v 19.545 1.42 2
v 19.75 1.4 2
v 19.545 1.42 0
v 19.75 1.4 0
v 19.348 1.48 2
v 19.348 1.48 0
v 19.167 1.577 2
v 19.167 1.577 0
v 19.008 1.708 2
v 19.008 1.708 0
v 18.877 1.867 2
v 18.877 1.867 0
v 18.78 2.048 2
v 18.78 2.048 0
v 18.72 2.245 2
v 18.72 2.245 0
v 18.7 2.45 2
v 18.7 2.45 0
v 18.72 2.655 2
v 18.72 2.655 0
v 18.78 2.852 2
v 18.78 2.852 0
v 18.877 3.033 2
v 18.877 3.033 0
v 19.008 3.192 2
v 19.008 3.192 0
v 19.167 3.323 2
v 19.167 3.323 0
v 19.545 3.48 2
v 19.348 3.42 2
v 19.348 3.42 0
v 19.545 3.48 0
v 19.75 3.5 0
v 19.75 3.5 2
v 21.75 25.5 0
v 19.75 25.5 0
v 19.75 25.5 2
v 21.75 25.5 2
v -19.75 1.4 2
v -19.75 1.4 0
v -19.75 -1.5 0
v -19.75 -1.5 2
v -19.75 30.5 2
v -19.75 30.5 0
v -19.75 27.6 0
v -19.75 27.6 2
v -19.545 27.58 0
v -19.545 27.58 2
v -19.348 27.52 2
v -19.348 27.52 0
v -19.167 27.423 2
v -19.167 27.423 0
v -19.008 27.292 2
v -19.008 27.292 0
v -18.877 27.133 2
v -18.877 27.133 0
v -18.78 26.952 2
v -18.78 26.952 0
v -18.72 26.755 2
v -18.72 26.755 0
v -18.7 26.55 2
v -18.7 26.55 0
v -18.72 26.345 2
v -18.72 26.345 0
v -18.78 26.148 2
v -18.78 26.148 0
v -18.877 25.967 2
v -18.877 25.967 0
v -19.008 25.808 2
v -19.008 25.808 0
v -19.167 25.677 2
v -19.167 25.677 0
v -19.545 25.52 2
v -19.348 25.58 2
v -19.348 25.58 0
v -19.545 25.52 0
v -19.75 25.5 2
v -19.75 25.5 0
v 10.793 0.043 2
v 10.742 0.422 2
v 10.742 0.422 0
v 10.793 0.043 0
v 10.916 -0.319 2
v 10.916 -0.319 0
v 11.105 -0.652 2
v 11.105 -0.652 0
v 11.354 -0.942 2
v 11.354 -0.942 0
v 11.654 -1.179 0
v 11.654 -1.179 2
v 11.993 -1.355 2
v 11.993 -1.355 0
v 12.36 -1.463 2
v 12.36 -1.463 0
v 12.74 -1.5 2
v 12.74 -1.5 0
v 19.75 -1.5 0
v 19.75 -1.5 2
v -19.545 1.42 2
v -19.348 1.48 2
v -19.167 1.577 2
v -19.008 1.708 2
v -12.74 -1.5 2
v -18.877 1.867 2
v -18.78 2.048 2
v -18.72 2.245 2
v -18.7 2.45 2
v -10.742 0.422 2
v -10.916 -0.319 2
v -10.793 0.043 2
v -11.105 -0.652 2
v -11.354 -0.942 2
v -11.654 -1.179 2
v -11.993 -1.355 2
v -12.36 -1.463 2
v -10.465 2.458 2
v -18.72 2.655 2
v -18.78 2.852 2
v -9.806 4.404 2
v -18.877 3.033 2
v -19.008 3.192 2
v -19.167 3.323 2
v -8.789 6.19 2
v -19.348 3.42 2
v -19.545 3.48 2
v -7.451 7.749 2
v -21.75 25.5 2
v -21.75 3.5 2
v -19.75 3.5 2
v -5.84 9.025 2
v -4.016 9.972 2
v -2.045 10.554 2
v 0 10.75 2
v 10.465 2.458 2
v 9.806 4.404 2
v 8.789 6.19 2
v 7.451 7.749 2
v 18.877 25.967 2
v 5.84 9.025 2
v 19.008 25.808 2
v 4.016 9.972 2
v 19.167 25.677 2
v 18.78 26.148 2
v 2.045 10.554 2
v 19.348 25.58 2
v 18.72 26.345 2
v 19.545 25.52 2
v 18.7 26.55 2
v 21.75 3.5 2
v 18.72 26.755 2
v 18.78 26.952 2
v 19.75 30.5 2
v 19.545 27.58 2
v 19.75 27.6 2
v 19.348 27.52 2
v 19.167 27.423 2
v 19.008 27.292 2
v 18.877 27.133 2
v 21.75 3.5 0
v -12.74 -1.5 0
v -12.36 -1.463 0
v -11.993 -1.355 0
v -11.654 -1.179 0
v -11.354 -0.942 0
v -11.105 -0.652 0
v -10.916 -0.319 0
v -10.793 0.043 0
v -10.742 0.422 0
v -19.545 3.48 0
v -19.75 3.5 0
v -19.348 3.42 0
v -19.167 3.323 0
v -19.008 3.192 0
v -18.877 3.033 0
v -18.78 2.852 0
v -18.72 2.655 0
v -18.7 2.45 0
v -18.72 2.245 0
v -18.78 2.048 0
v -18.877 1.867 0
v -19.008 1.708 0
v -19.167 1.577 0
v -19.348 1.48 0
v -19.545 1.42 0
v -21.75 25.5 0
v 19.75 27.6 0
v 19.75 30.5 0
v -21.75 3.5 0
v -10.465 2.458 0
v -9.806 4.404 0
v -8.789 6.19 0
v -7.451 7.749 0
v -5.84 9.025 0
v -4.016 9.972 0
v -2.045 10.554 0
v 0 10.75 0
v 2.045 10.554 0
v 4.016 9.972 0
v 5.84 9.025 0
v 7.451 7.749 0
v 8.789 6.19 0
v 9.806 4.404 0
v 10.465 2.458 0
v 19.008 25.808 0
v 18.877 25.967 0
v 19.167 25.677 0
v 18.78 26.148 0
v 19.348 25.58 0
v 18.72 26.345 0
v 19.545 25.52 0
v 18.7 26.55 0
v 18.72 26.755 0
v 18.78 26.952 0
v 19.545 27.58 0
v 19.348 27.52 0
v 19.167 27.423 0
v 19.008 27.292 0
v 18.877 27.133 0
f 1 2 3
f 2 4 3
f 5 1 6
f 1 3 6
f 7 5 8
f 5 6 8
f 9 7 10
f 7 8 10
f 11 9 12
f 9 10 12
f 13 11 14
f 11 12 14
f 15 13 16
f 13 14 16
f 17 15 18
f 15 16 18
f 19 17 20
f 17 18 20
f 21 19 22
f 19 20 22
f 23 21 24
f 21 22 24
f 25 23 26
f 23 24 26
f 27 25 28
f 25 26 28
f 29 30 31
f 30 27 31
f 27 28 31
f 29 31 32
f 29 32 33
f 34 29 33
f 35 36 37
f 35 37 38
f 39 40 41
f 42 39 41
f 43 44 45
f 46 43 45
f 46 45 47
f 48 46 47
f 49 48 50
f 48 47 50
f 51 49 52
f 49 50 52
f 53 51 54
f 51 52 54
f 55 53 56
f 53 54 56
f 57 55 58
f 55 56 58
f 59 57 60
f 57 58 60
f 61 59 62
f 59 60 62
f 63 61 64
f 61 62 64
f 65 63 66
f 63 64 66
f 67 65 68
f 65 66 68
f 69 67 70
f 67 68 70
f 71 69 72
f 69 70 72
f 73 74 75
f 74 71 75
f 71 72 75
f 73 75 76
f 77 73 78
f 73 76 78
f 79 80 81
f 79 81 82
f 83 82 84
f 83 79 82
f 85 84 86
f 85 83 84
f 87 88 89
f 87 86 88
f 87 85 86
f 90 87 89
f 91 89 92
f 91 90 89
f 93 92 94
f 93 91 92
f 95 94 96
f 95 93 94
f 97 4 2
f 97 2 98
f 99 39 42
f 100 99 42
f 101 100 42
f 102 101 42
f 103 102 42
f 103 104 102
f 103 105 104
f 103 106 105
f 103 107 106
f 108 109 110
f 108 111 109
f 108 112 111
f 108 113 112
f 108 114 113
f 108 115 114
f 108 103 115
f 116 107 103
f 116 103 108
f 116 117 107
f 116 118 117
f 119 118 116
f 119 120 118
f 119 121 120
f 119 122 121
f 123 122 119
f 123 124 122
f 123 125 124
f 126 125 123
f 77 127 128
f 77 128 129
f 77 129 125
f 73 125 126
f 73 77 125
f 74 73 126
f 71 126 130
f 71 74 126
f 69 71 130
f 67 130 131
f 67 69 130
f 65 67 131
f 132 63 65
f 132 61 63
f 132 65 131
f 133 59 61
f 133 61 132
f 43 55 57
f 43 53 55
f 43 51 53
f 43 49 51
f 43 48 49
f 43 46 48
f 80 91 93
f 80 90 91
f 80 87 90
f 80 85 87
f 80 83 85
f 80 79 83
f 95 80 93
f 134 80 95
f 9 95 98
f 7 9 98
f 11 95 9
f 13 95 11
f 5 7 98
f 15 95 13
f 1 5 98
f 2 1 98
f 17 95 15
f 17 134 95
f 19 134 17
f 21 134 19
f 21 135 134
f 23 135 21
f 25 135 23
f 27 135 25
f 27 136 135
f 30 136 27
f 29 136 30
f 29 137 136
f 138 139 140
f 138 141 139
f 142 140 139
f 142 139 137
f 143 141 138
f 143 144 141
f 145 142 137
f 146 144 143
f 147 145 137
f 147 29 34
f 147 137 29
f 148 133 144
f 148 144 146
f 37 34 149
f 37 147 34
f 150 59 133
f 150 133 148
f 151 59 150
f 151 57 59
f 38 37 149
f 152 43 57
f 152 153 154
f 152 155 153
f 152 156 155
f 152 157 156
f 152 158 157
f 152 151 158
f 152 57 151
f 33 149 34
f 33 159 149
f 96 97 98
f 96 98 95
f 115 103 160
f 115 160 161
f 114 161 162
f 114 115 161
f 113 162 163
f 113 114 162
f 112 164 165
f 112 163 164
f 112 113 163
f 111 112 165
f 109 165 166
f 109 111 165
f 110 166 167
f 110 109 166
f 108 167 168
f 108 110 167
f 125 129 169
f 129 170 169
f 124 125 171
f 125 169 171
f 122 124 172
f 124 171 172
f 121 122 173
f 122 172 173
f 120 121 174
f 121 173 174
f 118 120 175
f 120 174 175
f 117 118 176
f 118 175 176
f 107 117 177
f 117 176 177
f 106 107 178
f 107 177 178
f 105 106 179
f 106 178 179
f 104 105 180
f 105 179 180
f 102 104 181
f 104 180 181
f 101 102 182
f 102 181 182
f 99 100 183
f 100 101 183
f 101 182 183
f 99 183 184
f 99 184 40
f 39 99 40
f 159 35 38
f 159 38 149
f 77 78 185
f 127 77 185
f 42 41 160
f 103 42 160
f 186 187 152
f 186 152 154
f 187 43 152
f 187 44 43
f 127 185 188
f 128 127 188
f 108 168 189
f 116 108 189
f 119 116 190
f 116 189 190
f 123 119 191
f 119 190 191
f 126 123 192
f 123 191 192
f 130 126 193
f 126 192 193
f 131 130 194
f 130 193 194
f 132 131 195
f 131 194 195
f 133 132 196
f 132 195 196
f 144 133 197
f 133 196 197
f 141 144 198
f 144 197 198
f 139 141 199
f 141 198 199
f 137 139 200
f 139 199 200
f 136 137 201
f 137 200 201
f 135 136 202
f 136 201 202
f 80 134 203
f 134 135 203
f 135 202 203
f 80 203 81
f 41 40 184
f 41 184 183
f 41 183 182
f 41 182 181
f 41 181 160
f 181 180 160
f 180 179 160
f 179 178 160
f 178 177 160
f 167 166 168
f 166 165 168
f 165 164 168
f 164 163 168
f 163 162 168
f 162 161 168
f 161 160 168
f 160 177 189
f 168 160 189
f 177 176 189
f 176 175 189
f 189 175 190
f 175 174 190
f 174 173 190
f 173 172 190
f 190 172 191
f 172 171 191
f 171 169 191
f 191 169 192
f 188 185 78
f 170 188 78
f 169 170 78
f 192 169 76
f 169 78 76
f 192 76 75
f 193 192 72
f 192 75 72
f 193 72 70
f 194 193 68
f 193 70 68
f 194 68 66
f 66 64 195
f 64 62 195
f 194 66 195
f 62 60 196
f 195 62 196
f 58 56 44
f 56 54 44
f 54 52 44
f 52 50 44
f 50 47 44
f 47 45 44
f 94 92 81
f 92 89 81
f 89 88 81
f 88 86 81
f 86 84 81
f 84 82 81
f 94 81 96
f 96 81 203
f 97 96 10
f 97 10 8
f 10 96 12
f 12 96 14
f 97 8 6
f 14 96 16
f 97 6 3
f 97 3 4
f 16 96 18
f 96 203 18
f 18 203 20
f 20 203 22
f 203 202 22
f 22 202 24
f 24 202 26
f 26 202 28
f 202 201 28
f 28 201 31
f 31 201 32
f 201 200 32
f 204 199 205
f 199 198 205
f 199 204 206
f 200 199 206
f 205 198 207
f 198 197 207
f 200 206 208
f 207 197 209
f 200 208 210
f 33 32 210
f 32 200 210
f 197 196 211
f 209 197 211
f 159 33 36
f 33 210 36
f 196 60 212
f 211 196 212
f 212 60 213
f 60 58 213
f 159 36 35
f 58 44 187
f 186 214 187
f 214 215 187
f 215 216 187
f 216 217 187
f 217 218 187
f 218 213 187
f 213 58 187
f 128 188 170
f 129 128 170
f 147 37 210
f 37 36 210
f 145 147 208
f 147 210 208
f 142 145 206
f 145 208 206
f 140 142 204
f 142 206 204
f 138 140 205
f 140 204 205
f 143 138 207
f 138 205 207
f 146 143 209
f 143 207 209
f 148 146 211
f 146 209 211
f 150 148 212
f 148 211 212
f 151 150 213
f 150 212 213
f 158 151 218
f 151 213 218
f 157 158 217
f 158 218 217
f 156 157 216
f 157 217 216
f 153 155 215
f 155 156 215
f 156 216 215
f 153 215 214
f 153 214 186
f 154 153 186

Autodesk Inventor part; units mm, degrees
ref_plane "YZ Plane" through (0, 0, 0) normal (1, 0, 0) x (0, 1, 0)
ref_plane "XZ Plane" through (0, 0, 0) normal (0, 1, 0) x (-1, 0, 0)
ref_plane "XY Plane" through (0, 0, 0) normal (0, 0, 1) x (1, 0, 0)
sketch "スケッチ1" plane through (0, 0, 0) normal (0, 0, 1) x (1, 0, 0)
  circle A0 centre (0, 0) radius 10.5 construction
  circle A1 centre (-13.5, 1) radius 1.35
  line L0 (-13.5, 28) -> (13.5, 28) construction
  line L1 (13.5, 28) -> (13.5, 1) construction
  line L2 (13.5, 1) -> (-13.5, 1) construction
  line L3 (-13.5, 1) -> (-13.5, 28) construction
  circle A2 centre (-13.5, 28) radius 1.35
  circle A3 centre (13.5, 1) radius 1.35
  circle A4 centre (13.5, 28) radius 1.35
  line L4 (-19.75, 30.5) -> (-19.75, 27.6)
  line L5 (-19.75, 30.5) -> (19.75, 30.5)
  line L6 (19.75, 30.5) -> (19.75, 27.6)
  line L7 (-19.75, 1.4) -> (-19.75, -1.5)
  line L8 (-19.75, -1.5) -> (-10.6448, -1.5)
  line L9 (19.75, 1.4) -> (19.75, -1.5)
  line L10 (19.75, -1.5) -> (10.6448, -1.5)
  line L11 (-19.75, 25.5) -> (-21.75, 25.5)
  line L12 (-21.75, 25.5) -> (-21.75, 3.5)
  line L13 (-21.75, 3.5) -> (-19.75, 3.5)
  arc A5 (-19.75, 25.5) -> (-19.75, 27.6) centre (-19.75, 26.55) ccw
  arc A6 (-19.75, 1.4) -> (-19.75, 3.5) centre (-19.75, 2.45) ccw
  line L14 (19.75, 25.5) -> (21.75, 25.5)
  line L15 (21.75, 25.5) -> (21.75, 3.5)
  line L16 (21.75, 3.5) -> (19.75, 3.5)
  arc A7 (19.75, 27.6) -> (19.75, 25.5) centre (19.75, 26.55) ccw
  line L17 (0, 28) -> (0, 0) construction
  arc A8 (19.75, 3.5) -> (19.75, 1.4) centre (19.75, 2.45) ccw
  line L18 (-13.5, 14.5) -> (-21.75, 14.5) construction
  arc A9 (10.6448, -1.5) -> (-10.6448, -1.5) centre (0, 0) ccw
  point P0 (0, 30.5)
  dimension "d8" = 21
  dimension "d10" = 27
  dimension "d12" = 1
  dimension "d13" = 2.7
  dimension "d38" = 27
  dimension "d44" = 27
  dimension "d47" = 1.05
  dimension "d48" = 39.5
  dimension "d49" = 2
  dimension "d50" = 5
  dimension "d51" = 32
  dimension "d52" = 5
  dimension "d53" = 10.75
extrude "押し出し1" add sketch "スケッチ1" along normal blind 2
fillet "フィレット1" radius 2 2 edges at (-10.6448, -1.5, 1) (10.6448, -1.5, 1)
sketch "スケッチ3" plane through (0, 0, 2) normal (0, 0, 1) x (1, 0, 0)
  circle A0 centre (-13.5, 1) radius 1.35 projected
  circle A1 centre (-13.5, 1) radius 1.35
  circle A2 centre (13.5, 1) radius 1.35 projected
  circle A3 centre (13.5, 1) radius 1.35
  circle A4 centre (13.5, 28) radius 1.35 projected
  circle A5 centre (13.5, 28) radius 1.35
  circle A6 centre (-13.5, 28) radius 1.35 projected
  circle A7 centre (-13.5, 28) radius 1.35
  point P0 (0, 0)
extrude "押し出し3" add sketch "スケッチ3" against normal up to surface (2 mm away)
equation "\"d38\" = d10"
equation "\"d44\" = d10"
equation "\"d50\" = d30"
equation "\"d51\" = d18 + 2 * d30"
equation "\"d52\" = d50"
equation "\"d30\" = 5"
equation "\"d18\" = 22"
properties part number "足首_サブフレーム_1_1" material "アルミニウム 2014-T4"
